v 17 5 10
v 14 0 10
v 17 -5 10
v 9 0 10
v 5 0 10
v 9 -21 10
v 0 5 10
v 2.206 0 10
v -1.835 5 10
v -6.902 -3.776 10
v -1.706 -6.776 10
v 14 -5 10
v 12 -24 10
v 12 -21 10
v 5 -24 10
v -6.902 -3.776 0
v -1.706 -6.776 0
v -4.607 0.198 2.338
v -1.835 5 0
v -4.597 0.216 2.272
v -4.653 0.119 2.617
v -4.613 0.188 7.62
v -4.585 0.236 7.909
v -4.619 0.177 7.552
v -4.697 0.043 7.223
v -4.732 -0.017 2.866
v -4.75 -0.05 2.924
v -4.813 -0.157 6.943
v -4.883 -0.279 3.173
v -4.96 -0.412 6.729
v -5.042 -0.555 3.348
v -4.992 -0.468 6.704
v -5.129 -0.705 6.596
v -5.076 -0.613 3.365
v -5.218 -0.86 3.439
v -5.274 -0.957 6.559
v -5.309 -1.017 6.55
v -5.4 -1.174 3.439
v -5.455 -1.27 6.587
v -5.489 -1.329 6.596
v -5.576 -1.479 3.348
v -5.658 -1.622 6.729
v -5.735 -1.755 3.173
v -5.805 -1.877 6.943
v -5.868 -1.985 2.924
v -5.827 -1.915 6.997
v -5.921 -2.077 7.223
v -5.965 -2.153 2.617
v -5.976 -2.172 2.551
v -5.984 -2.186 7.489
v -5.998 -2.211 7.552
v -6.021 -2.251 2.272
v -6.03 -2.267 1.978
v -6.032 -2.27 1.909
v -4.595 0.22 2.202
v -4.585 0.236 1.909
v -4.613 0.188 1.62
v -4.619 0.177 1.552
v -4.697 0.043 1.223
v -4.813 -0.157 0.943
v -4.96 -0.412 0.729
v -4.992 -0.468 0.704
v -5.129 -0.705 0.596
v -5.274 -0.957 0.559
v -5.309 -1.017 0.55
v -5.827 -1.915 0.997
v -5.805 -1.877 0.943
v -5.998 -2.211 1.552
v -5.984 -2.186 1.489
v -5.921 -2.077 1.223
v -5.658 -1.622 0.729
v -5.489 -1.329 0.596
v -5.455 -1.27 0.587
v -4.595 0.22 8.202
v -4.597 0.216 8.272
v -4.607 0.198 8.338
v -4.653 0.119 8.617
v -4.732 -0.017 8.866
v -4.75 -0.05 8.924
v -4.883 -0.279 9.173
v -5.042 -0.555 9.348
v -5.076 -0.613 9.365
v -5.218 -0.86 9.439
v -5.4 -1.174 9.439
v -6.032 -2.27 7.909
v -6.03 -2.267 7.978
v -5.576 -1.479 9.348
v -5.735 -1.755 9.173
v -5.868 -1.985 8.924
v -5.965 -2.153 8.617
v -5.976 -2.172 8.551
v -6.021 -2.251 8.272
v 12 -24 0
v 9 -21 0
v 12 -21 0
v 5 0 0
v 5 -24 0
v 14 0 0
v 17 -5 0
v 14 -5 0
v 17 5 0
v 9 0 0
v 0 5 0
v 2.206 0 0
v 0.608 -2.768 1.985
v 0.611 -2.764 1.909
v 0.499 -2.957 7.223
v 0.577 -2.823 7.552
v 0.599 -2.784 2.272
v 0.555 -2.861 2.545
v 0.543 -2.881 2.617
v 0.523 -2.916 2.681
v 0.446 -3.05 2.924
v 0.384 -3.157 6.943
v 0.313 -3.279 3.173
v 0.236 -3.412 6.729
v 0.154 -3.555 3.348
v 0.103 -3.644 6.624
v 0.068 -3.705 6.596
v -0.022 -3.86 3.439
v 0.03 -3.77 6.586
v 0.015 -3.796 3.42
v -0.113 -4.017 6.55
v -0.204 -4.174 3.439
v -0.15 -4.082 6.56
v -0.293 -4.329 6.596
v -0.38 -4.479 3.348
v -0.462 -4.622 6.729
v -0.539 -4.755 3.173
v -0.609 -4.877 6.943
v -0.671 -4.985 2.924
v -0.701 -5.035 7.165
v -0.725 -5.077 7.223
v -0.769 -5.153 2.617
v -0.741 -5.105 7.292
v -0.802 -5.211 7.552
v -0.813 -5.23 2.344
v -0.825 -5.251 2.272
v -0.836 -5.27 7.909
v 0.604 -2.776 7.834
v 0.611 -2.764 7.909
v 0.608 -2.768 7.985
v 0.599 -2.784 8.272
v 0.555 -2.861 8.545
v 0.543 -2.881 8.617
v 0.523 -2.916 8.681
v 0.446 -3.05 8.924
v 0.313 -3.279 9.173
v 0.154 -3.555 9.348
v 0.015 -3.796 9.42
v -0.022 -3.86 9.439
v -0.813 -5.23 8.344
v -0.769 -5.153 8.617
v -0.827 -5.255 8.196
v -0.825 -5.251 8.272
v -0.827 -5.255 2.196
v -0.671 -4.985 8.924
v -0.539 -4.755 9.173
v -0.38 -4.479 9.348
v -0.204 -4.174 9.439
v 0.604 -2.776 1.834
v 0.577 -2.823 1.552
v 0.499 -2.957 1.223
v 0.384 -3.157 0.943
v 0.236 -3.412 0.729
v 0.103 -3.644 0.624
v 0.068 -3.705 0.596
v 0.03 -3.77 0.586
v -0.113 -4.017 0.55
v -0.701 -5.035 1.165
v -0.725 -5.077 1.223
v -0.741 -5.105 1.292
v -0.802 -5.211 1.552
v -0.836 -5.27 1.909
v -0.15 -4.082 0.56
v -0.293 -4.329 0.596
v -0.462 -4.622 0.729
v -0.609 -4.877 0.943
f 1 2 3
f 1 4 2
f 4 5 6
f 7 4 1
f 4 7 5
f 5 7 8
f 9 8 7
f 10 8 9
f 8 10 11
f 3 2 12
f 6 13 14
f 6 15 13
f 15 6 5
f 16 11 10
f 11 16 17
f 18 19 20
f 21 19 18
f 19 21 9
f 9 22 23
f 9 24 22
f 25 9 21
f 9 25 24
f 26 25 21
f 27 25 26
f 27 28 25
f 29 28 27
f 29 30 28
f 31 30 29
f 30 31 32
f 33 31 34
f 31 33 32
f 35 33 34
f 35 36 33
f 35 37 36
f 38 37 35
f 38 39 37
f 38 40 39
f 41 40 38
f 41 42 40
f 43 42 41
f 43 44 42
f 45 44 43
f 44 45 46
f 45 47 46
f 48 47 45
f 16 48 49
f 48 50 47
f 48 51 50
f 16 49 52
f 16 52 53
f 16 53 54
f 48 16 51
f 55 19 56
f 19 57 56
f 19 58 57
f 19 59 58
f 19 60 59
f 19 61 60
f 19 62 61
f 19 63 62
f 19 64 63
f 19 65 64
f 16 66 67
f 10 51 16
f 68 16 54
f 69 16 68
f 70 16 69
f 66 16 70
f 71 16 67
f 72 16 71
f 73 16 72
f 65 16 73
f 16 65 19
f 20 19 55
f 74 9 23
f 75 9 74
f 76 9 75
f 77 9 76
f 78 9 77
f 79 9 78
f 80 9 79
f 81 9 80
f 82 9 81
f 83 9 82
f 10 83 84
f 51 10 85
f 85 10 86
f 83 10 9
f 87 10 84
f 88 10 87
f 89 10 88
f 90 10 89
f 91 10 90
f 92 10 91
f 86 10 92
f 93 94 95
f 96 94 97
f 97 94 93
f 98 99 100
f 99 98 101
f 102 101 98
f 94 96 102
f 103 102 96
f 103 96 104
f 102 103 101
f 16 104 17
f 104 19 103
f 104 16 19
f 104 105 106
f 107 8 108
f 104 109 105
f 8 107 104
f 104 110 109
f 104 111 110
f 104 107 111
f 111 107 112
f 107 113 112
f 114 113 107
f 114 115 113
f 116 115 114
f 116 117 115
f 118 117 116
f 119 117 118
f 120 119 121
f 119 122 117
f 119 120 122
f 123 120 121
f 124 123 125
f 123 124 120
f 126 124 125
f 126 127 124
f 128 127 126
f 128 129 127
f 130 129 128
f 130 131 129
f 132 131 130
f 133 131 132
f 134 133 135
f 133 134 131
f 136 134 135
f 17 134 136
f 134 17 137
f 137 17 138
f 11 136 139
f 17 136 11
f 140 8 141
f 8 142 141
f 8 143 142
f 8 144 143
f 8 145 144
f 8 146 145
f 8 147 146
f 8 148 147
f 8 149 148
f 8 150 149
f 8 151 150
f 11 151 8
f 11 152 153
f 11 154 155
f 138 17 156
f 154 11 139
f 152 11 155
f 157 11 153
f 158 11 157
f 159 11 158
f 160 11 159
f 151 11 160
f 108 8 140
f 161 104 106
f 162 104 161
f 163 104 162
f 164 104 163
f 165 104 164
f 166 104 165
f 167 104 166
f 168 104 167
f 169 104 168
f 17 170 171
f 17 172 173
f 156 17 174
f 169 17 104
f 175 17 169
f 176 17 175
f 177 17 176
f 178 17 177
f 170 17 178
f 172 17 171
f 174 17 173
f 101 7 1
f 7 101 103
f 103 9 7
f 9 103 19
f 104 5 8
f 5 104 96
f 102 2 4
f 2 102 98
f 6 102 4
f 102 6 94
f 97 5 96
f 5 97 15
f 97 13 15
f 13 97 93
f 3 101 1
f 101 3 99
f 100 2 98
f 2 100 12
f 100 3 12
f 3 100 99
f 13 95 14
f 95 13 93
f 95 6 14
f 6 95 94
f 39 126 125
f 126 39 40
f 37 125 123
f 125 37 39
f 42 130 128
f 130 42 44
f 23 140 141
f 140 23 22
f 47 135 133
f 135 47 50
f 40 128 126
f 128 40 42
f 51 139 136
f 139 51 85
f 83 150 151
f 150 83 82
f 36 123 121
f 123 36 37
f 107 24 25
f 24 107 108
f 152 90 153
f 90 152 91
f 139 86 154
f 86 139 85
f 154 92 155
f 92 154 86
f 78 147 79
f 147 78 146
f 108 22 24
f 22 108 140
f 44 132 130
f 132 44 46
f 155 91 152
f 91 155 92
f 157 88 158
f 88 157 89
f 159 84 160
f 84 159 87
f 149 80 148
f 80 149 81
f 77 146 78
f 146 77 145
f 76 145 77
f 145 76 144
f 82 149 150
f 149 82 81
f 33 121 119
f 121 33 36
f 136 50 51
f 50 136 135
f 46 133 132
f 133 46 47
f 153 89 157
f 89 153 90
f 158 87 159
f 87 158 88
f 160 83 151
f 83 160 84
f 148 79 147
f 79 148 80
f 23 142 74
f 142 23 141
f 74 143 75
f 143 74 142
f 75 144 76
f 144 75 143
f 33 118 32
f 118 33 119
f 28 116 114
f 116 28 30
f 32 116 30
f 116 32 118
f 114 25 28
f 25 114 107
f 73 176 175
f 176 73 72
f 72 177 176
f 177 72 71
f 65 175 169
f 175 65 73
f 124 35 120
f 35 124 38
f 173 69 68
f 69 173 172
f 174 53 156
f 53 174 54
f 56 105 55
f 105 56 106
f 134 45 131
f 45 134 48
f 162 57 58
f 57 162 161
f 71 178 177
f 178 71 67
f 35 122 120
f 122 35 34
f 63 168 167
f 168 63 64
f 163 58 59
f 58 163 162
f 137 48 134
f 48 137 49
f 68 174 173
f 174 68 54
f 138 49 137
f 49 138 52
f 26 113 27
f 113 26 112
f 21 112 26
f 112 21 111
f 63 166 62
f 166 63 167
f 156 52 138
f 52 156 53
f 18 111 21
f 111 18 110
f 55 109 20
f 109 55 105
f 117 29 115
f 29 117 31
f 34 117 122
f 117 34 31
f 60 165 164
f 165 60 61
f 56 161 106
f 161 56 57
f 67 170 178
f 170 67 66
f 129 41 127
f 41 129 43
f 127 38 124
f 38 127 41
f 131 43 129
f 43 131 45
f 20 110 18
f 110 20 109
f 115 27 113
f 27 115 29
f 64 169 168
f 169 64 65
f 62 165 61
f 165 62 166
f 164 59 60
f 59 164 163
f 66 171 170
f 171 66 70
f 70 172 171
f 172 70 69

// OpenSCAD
/*
 * Created by:
 * Thomas Buck <xythobuz@xythobuz.de> in March 2016
 *
 * Licensed under the Creative Commons - Attribution license.
 */

// -----------------------------------------------------------

$fn = 25;

height = 10;

// works properly from around 40 to 80 degrees
display_angle = 60; // in degrees

// "right", "left", "both" or "none"
hole_position = "both";
hole_diameter = 2.9;

// -----------------------------------------------------------

module holder() {
    // front part
    translate([10, 0, 0])
    difference() {
        translate([-13 + (5 * sin(display_angle - 45)),
                    -6 - (3 * sin(display_angle - 45)), 0])
            rotate([0, 0, display_angle])
            cube([13, 6, height]);
    
        // cut off top edge
        translate([-15, 5, 0])
            cube([10, 3, height]);
    }

    // upper body
    translate([0, 0, 0])
        cube([10, 5, height]);

    // lower body
    translate([5, -24, 0])
        cube([4, 24, height]);

    // upper border
    translate([10, 0, 0])
        cube([7, 5, height]);

    // upper lip
    translate([14, -5, 0])
        cube([3, 5, height]);

    // lower border
    translate([9, -24, 0])
        cube([3, 3, height]);
}

difference() {
    holder();
    
    // insert holes
    if ((hole_position == "right") || (hole_position == "both")) {
        rotate([0, 90, 90 + display_angle])
            translate([-8, 2.5 + (4 * sin(display_angle - 45)), -4])
            cylinder(d=hole_diameter, h=10);
    }
    if ((hole_position == "left") || (hole_position == "both")) {
        rotate([0, 90, 90 + display_angle])
            translate([-2, 2.5 + (4 * sin(display_angle - 45)), -4])
            cylinder(d=hole_diameter, h=10);
    }
}
